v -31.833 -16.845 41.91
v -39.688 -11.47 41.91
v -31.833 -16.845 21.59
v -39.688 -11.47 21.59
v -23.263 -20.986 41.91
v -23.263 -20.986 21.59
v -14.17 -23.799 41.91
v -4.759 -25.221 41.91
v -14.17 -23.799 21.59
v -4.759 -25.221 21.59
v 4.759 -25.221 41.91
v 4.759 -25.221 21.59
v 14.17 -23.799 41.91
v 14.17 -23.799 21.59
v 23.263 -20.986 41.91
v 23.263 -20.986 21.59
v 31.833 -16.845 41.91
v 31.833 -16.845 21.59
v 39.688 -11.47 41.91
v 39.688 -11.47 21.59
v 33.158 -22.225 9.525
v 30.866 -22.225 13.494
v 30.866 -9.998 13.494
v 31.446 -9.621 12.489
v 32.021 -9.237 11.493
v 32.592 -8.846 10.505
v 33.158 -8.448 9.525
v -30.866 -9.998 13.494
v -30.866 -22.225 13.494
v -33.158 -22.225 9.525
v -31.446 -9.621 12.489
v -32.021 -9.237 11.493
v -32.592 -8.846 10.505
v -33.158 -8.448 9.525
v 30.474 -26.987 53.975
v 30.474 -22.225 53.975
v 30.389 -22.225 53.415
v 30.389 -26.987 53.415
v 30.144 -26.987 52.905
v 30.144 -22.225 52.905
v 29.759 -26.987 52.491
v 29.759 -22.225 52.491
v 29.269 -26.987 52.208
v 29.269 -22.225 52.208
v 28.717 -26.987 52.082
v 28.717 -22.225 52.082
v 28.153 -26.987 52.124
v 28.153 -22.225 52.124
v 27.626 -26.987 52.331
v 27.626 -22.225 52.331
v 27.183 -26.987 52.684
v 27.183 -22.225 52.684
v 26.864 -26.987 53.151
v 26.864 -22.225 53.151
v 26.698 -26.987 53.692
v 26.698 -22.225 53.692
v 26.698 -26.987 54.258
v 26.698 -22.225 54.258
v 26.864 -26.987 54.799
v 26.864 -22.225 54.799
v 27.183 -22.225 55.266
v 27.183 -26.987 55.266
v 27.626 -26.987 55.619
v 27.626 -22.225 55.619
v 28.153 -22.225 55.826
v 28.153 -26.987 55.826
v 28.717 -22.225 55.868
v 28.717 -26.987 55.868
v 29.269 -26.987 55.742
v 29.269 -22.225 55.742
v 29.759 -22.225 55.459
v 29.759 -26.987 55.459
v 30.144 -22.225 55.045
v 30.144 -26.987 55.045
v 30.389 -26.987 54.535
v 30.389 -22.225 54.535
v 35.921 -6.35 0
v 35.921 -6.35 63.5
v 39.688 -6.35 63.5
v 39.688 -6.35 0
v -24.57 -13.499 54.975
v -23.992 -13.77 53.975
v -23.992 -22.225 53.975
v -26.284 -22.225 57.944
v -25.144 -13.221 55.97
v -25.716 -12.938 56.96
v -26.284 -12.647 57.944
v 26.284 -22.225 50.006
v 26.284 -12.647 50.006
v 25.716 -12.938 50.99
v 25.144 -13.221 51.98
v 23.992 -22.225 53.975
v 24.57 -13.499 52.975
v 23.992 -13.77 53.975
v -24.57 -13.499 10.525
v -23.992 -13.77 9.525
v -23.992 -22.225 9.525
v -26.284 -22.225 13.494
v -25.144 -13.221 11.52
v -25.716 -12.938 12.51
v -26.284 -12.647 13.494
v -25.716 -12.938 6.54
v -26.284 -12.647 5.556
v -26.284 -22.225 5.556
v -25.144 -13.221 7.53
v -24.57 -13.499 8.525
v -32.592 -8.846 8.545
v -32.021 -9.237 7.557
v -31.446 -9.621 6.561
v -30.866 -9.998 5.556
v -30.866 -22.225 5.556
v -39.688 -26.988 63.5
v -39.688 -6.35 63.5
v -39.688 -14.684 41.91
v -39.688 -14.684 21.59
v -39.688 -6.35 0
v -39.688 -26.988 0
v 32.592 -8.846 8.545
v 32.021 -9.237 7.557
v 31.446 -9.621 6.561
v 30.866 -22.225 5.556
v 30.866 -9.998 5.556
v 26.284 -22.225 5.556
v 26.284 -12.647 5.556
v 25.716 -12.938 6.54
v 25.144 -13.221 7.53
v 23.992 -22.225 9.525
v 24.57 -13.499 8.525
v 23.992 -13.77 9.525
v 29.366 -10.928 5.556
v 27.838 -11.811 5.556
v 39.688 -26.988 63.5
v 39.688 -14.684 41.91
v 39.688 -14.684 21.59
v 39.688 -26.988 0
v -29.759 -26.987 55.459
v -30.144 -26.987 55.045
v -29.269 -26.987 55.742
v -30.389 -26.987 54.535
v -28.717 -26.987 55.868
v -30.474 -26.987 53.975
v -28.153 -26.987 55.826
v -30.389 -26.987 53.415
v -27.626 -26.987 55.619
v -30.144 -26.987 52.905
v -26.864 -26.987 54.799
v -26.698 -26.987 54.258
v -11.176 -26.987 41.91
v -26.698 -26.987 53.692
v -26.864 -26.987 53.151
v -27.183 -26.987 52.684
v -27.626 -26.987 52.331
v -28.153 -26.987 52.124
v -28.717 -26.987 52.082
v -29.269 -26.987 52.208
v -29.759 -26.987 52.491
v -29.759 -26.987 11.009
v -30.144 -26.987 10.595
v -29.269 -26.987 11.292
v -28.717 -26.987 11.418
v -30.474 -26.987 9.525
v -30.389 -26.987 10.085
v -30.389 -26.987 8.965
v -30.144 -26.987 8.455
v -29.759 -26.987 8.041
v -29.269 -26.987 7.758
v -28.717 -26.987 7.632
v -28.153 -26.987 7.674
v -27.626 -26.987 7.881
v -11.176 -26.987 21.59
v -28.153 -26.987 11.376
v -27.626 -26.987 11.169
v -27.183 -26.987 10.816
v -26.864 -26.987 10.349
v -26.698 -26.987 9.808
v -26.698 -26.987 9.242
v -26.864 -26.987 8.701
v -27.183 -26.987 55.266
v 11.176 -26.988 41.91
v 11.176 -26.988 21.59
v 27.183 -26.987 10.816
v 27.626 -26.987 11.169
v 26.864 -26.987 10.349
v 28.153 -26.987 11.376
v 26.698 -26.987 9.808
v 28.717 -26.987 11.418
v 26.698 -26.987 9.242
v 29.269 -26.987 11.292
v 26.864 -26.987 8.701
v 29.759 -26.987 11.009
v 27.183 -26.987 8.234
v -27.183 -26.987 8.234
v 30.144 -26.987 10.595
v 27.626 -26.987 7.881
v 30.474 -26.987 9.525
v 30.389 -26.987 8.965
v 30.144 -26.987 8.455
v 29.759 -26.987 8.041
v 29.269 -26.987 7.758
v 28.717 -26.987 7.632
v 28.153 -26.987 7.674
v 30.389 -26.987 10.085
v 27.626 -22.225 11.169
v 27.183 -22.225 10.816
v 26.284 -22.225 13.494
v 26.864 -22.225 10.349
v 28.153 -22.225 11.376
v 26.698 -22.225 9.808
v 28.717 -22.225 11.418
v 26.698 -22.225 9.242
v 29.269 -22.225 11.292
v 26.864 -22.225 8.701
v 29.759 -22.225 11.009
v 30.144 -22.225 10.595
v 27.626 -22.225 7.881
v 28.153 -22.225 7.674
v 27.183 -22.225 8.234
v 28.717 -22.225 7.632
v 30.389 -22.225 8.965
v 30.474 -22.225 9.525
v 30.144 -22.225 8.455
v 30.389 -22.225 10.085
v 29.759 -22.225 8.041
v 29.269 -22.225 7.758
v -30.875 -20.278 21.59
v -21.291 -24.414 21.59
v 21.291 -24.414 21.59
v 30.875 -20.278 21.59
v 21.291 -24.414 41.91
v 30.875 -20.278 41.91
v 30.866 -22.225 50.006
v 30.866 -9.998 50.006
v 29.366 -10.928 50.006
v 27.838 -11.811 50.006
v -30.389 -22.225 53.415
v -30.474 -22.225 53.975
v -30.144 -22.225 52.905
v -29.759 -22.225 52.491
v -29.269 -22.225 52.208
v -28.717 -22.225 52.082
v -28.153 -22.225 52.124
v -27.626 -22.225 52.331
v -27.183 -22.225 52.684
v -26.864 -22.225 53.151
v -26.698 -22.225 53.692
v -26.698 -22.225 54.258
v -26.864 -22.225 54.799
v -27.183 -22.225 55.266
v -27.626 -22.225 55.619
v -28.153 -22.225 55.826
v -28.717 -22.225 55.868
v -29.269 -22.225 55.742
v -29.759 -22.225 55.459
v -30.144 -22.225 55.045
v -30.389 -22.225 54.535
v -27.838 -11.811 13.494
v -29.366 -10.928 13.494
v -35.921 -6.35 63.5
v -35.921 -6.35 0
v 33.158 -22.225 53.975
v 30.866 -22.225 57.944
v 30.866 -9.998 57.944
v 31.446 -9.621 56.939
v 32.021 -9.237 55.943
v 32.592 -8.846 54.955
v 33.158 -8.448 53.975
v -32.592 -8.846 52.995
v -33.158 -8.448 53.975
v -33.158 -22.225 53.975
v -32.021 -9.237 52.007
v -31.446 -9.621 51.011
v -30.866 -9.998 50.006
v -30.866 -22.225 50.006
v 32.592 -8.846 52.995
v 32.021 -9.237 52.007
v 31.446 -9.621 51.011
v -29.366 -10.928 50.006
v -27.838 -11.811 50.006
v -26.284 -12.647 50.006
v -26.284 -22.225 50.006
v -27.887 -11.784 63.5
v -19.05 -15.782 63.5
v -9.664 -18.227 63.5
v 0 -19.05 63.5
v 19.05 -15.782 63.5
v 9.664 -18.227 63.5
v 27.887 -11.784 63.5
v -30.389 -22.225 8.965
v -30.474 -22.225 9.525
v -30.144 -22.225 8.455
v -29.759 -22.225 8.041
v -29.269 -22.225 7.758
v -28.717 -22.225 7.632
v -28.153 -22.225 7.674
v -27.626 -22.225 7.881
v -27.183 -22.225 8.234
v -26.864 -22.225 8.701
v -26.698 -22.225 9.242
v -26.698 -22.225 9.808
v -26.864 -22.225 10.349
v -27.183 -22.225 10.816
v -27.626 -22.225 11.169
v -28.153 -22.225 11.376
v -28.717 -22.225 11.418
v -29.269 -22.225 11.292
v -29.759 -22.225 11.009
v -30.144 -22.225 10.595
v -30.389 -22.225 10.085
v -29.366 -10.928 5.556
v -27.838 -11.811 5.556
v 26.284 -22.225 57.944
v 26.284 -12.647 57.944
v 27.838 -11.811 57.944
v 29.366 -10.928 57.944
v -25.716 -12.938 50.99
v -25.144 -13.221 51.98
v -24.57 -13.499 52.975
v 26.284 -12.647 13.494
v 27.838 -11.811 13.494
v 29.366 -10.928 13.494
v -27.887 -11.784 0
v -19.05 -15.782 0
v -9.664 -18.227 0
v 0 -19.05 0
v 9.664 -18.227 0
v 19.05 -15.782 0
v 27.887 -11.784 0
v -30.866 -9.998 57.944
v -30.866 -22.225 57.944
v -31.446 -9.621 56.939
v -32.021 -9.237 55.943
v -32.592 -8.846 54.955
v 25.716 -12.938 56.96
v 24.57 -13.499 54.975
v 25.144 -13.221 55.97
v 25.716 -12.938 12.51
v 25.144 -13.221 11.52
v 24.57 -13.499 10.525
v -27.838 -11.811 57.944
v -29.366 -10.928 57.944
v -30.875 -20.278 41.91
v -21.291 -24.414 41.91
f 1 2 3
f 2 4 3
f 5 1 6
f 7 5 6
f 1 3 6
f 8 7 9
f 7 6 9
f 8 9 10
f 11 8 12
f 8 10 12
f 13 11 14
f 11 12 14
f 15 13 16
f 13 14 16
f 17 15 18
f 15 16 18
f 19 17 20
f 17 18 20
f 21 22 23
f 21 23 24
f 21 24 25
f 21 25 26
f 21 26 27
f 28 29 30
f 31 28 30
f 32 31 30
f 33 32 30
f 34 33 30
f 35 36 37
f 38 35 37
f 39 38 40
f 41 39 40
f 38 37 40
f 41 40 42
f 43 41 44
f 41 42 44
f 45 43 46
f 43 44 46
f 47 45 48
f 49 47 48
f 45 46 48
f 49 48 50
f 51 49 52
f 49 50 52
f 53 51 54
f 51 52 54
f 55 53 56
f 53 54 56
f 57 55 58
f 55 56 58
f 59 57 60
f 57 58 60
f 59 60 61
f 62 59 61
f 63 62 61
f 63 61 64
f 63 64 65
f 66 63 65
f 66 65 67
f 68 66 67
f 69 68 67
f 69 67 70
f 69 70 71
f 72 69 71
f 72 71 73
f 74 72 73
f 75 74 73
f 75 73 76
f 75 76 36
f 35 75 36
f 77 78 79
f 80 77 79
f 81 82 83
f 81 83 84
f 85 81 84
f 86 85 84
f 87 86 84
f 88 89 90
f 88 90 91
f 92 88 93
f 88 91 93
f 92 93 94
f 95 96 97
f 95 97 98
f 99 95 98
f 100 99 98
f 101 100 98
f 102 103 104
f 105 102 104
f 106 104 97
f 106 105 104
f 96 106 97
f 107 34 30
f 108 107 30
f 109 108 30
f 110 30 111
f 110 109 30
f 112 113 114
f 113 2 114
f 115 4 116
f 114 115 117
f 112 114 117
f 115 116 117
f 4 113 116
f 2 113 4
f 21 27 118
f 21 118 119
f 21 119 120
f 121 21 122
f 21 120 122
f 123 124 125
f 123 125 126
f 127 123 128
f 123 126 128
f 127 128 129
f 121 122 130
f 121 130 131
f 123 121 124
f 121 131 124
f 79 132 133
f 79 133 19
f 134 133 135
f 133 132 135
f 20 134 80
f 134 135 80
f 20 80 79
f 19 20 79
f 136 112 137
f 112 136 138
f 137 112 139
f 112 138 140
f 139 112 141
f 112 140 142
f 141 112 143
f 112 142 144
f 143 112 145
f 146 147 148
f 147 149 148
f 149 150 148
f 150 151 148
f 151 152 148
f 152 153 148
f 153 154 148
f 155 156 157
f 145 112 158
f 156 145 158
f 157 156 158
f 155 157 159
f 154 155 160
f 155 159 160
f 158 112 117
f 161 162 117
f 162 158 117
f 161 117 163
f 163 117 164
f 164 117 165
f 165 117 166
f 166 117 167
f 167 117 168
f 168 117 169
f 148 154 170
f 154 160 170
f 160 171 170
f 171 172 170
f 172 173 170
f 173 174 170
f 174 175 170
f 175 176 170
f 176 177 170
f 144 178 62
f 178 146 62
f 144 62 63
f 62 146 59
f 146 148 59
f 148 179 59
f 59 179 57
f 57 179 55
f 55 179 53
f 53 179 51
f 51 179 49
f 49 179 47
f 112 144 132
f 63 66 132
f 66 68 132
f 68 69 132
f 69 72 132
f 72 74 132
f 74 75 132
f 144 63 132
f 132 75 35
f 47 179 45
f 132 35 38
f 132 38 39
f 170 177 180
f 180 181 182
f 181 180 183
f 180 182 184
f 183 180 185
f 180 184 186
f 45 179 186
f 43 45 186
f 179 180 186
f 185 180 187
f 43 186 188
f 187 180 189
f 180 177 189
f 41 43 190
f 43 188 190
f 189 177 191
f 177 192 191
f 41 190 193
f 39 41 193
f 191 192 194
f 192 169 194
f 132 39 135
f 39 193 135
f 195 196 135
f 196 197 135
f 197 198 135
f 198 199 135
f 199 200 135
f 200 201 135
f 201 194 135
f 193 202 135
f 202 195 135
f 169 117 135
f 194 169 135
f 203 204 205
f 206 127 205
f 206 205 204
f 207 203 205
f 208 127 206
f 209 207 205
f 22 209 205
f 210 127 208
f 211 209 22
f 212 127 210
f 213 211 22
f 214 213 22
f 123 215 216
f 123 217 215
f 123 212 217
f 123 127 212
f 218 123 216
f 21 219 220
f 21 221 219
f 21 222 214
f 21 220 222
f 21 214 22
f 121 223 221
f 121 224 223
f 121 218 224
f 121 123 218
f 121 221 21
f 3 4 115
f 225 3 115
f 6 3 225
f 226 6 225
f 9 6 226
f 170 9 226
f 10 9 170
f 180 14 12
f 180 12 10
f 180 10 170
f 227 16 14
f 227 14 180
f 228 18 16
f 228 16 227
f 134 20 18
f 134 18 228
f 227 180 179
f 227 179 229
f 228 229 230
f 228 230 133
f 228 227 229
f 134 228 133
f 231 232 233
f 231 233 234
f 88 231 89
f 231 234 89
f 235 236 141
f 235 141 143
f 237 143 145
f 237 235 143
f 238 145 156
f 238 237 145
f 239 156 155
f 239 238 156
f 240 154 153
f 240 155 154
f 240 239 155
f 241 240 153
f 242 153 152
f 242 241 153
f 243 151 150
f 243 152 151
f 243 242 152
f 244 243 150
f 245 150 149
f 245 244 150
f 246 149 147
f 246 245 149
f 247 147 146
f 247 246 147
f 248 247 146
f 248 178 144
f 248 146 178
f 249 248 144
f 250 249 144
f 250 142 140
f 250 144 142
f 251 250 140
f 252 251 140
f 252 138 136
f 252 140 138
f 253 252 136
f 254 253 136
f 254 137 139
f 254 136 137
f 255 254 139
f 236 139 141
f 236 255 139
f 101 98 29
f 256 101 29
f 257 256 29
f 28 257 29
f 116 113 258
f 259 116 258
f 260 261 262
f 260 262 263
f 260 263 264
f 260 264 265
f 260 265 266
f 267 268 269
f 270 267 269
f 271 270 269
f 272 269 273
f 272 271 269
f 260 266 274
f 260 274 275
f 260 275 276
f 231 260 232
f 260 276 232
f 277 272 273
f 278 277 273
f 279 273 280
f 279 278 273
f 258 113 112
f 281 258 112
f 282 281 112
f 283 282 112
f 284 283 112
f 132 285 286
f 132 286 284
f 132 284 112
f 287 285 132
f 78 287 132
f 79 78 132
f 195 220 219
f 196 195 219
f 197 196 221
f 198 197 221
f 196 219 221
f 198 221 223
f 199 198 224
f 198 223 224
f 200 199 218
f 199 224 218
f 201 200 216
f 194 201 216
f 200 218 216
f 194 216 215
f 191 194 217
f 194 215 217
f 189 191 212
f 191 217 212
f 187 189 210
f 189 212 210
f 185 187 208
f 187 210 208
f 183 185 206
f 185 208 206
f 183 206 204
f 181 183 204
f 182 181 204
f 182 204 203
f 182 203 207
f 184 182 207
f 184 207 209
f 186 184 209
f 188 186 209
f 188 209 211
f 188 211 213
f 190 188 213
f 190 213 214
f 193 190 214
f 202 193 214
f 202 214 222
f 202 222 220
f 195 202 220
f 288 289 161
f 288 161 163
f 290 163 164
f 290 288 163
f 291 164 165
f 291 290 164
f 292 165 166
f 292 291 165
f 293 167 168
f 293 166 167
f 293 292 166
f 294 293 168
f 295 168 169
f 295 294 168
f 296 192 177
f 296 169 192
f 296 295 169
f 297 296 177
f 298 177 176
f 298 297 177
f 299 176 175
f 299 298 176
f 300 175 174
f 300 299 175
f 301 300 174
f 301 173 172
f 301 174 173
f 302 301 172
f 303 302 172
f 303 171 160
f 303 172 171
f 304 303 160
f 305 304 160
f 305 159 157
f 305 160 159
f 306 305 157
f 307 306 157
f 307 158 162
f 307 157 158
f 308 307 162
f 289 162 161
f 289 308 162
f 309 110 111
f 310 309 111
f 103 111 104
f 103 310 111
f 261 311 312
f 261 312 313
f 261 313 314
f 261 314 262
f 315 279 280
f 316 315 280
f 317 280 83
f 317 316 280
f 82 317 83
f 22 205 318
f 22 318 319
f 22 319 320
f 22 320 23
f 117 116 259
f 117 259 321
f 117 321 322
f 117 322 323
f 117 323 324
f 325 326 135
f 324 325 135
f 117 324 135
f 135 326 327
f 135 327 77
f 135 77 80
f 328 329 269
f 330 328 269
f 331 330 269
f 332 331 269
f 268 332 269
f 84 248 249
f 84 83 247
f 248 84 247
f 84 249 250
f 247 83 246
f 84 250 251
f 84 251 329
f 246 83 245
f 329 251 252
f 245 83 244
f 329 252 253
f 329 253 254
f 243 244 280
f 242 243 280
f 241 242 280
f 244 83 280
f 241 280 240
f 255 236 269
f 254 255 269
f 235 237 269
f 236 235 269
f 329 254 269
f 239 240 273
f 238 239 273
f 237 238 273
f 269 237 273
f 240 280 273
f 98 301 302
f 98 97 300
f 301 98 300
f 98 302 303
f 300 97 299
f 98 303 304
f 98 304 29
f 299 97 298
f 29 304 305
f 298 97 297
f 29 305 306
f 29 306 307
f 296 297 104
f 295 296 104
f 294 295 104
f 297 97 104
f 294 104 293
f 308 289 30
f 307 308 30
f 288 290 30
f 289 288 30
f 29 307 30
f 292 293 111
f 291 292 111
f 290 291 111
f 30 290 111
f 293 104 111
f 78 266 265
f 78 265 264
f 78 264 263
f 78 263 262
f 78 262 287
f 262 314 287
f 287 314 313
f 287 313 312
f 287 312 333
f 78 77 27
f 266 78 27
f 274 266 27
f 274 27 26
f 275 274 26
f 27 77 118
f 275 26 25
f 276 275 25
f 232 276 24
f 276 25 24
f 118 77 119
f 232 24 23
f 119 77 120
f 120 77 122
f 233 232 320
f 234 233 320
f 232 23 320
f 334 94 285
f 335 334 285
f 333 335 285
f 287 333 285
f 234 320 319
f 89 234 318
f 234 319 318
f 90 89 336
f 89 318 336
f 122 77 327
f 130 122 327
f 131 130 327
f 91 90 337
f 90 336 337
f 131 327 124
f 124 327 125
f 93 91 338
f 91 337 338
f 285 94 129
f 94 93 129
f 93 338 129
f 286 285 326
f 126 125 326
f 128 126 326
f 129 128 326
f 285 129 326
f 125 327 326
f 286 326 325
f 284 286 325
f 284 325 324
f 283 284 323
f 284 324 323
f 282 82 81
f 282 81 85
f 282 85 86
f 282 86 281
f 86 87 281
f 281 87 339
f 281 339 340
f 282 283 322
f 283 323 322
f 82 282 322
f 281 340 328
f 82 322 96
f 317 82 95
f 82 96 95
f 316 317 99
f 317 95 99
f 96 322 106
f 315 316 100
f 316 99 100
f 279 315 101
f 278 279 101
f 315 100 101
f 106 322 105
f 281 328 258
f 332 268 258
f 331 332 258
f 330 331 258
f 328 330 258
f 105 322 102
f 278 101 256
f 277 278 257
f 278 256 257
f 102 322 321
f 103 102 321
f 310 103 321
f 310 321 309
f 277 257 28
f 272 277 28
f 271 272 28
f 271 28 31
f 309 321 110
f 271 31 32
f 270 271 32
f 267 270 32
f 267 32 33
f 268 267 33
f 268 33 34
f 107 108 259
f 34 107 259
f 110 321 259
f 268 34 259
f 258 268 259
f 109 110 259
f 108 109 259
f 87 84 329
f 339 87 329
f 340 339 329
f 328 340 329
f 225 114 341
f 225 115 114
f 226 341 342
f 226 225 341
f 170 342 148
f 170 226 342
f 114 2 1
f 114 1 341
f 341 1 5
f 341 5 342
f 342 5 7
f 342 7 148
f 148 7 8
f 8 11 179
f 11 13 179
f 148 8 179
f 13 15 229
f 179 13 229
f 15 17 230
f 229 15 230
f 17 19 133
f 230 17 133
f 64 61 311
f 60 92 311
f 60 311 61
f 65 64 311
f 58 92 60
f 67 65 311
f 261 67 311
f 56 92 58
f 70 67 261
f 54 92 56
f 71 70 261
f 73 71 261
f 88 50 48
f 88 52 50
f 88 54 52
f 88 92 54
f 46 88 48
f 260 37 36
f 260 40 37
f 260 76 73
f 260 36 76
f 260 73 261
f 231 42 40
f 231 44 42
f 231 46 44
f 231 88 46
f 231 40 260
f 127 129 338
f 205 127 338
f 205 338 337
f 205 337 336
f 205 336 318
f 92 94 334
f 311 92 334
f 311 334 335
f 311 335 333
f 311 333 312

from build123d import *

# Parameters (mm, degrees)
BOSS_EXTRUDE1_DEPTH   = 63.5
SKETCH2_W             = 127
SKETCH2_H             = 12.7
CUT_EXTRUDE1_DEPTH    = 80.596939718
SKETCH3_W             = 20.32
SKETCH3_H             = 2.54
F_6_CLEARANCE_HOLE1_D = 3.7973
CUT_EXTRUDE2_DEPTH    = 22.225


with BuildPart() as part:
    # Sketch1 → Boss-Extrude1 (new body)
    with BuildSketch(Plane.XY):
        with BuildLine():
            Line((-39.6875, -3.022072464), (-39.6875, -26.9875))
            Line((-39.6875, -26.9875), (39.6875, -26.9875))
            Line((39.6875, -26.9875), (39.6875, -3.022072464))
            ThreePointArc((39.6875, -3.022072464), (0, -19.05), (-39.6875, -3.022072464))
        make_face()
    extrude(amount=BOSS_EXTRUDE1_DEPTH)

    # Sketch2 → Cut-Extrude1 (cut, through all)
    with BuildSketch(Plane.XY.offset(63.5)):
        Rectangle(SKETCH2_W, SKETCH2_H)
    extrude(amount=-CUT_EXTRUDE1_DEPTH, mode=Mode.SUBTRACT)

    # Sketch3 → Cut-Revolve1 (revolve, cut)
    with BuildSketch(Plane(origin=(0, 0, 0), x_dir=(0, 0, -1), z_dir=(1, 0, 0))):
        with Locations((-31.75, -26.67)):
            Rectangle(SKETCH3_W, SKETCH3_H)
    revolve(axis=Axis((0, 38.1, 16.404698597), (0, 0, 1)), mode=Mode.SUBTRACT)

    # #6 Clearance Hole1 (through all)
    with Locations(Plane(origin=(0, -26.9875, 0), x_dir=(-1, 0, 0), z_dir=(0, -1, 0))):
        with Locations((-28.575, -9.525), (-28.575, -53.975)):
            f_6_clearance_hole1 = Hole(F_6_CLEARANCE_HOLE1_D / 2)

    # Sketch10 → Cut-Extrude2 (cut)
    with BuildSketch(Plane(origin=(0, 0, 0), x_dir=(1, 0, 0), z_dir=(0, 1, 0))):
        Polygon((23.992282238, -9.525), (26.283641119, -13.49375), (30.866358881, -13.49375), (33.157717762, -9.525), (30.866358881, -5.55625), (26.283641119, -5.55625), align=None)
        Polygon((23.992282238, -53.975), (26.283641119, -57.94375), (30.866358881, -57.94375), (33.157717762, -53.975), (30.866358881, -50.00625), (26.283641119, -50.00625), align=None)
    cut_extrude2 = extrude(amount=-CUT_EXTRUDE2_DEPTH, mode=Mode.SUBTRACT)

    # Mirror1: #6 Clearance Hole1, Cut-Extrude2 across plane
    add(f_6_clearance_hole1.mirror(Plane(origin=(0, 0, 0), x_dir=(0, 0, 1), z_dir=(1, 0, 0))), mode=Mode.SUBTRACT)
    add(cut_extrude2.mirror(Plane(origin=(0, 0, 0), x_dir=(0, 0, 1), z_dir=(1, 0, 0))), mode=Mode.SUBTRACT)


solid = part.part
